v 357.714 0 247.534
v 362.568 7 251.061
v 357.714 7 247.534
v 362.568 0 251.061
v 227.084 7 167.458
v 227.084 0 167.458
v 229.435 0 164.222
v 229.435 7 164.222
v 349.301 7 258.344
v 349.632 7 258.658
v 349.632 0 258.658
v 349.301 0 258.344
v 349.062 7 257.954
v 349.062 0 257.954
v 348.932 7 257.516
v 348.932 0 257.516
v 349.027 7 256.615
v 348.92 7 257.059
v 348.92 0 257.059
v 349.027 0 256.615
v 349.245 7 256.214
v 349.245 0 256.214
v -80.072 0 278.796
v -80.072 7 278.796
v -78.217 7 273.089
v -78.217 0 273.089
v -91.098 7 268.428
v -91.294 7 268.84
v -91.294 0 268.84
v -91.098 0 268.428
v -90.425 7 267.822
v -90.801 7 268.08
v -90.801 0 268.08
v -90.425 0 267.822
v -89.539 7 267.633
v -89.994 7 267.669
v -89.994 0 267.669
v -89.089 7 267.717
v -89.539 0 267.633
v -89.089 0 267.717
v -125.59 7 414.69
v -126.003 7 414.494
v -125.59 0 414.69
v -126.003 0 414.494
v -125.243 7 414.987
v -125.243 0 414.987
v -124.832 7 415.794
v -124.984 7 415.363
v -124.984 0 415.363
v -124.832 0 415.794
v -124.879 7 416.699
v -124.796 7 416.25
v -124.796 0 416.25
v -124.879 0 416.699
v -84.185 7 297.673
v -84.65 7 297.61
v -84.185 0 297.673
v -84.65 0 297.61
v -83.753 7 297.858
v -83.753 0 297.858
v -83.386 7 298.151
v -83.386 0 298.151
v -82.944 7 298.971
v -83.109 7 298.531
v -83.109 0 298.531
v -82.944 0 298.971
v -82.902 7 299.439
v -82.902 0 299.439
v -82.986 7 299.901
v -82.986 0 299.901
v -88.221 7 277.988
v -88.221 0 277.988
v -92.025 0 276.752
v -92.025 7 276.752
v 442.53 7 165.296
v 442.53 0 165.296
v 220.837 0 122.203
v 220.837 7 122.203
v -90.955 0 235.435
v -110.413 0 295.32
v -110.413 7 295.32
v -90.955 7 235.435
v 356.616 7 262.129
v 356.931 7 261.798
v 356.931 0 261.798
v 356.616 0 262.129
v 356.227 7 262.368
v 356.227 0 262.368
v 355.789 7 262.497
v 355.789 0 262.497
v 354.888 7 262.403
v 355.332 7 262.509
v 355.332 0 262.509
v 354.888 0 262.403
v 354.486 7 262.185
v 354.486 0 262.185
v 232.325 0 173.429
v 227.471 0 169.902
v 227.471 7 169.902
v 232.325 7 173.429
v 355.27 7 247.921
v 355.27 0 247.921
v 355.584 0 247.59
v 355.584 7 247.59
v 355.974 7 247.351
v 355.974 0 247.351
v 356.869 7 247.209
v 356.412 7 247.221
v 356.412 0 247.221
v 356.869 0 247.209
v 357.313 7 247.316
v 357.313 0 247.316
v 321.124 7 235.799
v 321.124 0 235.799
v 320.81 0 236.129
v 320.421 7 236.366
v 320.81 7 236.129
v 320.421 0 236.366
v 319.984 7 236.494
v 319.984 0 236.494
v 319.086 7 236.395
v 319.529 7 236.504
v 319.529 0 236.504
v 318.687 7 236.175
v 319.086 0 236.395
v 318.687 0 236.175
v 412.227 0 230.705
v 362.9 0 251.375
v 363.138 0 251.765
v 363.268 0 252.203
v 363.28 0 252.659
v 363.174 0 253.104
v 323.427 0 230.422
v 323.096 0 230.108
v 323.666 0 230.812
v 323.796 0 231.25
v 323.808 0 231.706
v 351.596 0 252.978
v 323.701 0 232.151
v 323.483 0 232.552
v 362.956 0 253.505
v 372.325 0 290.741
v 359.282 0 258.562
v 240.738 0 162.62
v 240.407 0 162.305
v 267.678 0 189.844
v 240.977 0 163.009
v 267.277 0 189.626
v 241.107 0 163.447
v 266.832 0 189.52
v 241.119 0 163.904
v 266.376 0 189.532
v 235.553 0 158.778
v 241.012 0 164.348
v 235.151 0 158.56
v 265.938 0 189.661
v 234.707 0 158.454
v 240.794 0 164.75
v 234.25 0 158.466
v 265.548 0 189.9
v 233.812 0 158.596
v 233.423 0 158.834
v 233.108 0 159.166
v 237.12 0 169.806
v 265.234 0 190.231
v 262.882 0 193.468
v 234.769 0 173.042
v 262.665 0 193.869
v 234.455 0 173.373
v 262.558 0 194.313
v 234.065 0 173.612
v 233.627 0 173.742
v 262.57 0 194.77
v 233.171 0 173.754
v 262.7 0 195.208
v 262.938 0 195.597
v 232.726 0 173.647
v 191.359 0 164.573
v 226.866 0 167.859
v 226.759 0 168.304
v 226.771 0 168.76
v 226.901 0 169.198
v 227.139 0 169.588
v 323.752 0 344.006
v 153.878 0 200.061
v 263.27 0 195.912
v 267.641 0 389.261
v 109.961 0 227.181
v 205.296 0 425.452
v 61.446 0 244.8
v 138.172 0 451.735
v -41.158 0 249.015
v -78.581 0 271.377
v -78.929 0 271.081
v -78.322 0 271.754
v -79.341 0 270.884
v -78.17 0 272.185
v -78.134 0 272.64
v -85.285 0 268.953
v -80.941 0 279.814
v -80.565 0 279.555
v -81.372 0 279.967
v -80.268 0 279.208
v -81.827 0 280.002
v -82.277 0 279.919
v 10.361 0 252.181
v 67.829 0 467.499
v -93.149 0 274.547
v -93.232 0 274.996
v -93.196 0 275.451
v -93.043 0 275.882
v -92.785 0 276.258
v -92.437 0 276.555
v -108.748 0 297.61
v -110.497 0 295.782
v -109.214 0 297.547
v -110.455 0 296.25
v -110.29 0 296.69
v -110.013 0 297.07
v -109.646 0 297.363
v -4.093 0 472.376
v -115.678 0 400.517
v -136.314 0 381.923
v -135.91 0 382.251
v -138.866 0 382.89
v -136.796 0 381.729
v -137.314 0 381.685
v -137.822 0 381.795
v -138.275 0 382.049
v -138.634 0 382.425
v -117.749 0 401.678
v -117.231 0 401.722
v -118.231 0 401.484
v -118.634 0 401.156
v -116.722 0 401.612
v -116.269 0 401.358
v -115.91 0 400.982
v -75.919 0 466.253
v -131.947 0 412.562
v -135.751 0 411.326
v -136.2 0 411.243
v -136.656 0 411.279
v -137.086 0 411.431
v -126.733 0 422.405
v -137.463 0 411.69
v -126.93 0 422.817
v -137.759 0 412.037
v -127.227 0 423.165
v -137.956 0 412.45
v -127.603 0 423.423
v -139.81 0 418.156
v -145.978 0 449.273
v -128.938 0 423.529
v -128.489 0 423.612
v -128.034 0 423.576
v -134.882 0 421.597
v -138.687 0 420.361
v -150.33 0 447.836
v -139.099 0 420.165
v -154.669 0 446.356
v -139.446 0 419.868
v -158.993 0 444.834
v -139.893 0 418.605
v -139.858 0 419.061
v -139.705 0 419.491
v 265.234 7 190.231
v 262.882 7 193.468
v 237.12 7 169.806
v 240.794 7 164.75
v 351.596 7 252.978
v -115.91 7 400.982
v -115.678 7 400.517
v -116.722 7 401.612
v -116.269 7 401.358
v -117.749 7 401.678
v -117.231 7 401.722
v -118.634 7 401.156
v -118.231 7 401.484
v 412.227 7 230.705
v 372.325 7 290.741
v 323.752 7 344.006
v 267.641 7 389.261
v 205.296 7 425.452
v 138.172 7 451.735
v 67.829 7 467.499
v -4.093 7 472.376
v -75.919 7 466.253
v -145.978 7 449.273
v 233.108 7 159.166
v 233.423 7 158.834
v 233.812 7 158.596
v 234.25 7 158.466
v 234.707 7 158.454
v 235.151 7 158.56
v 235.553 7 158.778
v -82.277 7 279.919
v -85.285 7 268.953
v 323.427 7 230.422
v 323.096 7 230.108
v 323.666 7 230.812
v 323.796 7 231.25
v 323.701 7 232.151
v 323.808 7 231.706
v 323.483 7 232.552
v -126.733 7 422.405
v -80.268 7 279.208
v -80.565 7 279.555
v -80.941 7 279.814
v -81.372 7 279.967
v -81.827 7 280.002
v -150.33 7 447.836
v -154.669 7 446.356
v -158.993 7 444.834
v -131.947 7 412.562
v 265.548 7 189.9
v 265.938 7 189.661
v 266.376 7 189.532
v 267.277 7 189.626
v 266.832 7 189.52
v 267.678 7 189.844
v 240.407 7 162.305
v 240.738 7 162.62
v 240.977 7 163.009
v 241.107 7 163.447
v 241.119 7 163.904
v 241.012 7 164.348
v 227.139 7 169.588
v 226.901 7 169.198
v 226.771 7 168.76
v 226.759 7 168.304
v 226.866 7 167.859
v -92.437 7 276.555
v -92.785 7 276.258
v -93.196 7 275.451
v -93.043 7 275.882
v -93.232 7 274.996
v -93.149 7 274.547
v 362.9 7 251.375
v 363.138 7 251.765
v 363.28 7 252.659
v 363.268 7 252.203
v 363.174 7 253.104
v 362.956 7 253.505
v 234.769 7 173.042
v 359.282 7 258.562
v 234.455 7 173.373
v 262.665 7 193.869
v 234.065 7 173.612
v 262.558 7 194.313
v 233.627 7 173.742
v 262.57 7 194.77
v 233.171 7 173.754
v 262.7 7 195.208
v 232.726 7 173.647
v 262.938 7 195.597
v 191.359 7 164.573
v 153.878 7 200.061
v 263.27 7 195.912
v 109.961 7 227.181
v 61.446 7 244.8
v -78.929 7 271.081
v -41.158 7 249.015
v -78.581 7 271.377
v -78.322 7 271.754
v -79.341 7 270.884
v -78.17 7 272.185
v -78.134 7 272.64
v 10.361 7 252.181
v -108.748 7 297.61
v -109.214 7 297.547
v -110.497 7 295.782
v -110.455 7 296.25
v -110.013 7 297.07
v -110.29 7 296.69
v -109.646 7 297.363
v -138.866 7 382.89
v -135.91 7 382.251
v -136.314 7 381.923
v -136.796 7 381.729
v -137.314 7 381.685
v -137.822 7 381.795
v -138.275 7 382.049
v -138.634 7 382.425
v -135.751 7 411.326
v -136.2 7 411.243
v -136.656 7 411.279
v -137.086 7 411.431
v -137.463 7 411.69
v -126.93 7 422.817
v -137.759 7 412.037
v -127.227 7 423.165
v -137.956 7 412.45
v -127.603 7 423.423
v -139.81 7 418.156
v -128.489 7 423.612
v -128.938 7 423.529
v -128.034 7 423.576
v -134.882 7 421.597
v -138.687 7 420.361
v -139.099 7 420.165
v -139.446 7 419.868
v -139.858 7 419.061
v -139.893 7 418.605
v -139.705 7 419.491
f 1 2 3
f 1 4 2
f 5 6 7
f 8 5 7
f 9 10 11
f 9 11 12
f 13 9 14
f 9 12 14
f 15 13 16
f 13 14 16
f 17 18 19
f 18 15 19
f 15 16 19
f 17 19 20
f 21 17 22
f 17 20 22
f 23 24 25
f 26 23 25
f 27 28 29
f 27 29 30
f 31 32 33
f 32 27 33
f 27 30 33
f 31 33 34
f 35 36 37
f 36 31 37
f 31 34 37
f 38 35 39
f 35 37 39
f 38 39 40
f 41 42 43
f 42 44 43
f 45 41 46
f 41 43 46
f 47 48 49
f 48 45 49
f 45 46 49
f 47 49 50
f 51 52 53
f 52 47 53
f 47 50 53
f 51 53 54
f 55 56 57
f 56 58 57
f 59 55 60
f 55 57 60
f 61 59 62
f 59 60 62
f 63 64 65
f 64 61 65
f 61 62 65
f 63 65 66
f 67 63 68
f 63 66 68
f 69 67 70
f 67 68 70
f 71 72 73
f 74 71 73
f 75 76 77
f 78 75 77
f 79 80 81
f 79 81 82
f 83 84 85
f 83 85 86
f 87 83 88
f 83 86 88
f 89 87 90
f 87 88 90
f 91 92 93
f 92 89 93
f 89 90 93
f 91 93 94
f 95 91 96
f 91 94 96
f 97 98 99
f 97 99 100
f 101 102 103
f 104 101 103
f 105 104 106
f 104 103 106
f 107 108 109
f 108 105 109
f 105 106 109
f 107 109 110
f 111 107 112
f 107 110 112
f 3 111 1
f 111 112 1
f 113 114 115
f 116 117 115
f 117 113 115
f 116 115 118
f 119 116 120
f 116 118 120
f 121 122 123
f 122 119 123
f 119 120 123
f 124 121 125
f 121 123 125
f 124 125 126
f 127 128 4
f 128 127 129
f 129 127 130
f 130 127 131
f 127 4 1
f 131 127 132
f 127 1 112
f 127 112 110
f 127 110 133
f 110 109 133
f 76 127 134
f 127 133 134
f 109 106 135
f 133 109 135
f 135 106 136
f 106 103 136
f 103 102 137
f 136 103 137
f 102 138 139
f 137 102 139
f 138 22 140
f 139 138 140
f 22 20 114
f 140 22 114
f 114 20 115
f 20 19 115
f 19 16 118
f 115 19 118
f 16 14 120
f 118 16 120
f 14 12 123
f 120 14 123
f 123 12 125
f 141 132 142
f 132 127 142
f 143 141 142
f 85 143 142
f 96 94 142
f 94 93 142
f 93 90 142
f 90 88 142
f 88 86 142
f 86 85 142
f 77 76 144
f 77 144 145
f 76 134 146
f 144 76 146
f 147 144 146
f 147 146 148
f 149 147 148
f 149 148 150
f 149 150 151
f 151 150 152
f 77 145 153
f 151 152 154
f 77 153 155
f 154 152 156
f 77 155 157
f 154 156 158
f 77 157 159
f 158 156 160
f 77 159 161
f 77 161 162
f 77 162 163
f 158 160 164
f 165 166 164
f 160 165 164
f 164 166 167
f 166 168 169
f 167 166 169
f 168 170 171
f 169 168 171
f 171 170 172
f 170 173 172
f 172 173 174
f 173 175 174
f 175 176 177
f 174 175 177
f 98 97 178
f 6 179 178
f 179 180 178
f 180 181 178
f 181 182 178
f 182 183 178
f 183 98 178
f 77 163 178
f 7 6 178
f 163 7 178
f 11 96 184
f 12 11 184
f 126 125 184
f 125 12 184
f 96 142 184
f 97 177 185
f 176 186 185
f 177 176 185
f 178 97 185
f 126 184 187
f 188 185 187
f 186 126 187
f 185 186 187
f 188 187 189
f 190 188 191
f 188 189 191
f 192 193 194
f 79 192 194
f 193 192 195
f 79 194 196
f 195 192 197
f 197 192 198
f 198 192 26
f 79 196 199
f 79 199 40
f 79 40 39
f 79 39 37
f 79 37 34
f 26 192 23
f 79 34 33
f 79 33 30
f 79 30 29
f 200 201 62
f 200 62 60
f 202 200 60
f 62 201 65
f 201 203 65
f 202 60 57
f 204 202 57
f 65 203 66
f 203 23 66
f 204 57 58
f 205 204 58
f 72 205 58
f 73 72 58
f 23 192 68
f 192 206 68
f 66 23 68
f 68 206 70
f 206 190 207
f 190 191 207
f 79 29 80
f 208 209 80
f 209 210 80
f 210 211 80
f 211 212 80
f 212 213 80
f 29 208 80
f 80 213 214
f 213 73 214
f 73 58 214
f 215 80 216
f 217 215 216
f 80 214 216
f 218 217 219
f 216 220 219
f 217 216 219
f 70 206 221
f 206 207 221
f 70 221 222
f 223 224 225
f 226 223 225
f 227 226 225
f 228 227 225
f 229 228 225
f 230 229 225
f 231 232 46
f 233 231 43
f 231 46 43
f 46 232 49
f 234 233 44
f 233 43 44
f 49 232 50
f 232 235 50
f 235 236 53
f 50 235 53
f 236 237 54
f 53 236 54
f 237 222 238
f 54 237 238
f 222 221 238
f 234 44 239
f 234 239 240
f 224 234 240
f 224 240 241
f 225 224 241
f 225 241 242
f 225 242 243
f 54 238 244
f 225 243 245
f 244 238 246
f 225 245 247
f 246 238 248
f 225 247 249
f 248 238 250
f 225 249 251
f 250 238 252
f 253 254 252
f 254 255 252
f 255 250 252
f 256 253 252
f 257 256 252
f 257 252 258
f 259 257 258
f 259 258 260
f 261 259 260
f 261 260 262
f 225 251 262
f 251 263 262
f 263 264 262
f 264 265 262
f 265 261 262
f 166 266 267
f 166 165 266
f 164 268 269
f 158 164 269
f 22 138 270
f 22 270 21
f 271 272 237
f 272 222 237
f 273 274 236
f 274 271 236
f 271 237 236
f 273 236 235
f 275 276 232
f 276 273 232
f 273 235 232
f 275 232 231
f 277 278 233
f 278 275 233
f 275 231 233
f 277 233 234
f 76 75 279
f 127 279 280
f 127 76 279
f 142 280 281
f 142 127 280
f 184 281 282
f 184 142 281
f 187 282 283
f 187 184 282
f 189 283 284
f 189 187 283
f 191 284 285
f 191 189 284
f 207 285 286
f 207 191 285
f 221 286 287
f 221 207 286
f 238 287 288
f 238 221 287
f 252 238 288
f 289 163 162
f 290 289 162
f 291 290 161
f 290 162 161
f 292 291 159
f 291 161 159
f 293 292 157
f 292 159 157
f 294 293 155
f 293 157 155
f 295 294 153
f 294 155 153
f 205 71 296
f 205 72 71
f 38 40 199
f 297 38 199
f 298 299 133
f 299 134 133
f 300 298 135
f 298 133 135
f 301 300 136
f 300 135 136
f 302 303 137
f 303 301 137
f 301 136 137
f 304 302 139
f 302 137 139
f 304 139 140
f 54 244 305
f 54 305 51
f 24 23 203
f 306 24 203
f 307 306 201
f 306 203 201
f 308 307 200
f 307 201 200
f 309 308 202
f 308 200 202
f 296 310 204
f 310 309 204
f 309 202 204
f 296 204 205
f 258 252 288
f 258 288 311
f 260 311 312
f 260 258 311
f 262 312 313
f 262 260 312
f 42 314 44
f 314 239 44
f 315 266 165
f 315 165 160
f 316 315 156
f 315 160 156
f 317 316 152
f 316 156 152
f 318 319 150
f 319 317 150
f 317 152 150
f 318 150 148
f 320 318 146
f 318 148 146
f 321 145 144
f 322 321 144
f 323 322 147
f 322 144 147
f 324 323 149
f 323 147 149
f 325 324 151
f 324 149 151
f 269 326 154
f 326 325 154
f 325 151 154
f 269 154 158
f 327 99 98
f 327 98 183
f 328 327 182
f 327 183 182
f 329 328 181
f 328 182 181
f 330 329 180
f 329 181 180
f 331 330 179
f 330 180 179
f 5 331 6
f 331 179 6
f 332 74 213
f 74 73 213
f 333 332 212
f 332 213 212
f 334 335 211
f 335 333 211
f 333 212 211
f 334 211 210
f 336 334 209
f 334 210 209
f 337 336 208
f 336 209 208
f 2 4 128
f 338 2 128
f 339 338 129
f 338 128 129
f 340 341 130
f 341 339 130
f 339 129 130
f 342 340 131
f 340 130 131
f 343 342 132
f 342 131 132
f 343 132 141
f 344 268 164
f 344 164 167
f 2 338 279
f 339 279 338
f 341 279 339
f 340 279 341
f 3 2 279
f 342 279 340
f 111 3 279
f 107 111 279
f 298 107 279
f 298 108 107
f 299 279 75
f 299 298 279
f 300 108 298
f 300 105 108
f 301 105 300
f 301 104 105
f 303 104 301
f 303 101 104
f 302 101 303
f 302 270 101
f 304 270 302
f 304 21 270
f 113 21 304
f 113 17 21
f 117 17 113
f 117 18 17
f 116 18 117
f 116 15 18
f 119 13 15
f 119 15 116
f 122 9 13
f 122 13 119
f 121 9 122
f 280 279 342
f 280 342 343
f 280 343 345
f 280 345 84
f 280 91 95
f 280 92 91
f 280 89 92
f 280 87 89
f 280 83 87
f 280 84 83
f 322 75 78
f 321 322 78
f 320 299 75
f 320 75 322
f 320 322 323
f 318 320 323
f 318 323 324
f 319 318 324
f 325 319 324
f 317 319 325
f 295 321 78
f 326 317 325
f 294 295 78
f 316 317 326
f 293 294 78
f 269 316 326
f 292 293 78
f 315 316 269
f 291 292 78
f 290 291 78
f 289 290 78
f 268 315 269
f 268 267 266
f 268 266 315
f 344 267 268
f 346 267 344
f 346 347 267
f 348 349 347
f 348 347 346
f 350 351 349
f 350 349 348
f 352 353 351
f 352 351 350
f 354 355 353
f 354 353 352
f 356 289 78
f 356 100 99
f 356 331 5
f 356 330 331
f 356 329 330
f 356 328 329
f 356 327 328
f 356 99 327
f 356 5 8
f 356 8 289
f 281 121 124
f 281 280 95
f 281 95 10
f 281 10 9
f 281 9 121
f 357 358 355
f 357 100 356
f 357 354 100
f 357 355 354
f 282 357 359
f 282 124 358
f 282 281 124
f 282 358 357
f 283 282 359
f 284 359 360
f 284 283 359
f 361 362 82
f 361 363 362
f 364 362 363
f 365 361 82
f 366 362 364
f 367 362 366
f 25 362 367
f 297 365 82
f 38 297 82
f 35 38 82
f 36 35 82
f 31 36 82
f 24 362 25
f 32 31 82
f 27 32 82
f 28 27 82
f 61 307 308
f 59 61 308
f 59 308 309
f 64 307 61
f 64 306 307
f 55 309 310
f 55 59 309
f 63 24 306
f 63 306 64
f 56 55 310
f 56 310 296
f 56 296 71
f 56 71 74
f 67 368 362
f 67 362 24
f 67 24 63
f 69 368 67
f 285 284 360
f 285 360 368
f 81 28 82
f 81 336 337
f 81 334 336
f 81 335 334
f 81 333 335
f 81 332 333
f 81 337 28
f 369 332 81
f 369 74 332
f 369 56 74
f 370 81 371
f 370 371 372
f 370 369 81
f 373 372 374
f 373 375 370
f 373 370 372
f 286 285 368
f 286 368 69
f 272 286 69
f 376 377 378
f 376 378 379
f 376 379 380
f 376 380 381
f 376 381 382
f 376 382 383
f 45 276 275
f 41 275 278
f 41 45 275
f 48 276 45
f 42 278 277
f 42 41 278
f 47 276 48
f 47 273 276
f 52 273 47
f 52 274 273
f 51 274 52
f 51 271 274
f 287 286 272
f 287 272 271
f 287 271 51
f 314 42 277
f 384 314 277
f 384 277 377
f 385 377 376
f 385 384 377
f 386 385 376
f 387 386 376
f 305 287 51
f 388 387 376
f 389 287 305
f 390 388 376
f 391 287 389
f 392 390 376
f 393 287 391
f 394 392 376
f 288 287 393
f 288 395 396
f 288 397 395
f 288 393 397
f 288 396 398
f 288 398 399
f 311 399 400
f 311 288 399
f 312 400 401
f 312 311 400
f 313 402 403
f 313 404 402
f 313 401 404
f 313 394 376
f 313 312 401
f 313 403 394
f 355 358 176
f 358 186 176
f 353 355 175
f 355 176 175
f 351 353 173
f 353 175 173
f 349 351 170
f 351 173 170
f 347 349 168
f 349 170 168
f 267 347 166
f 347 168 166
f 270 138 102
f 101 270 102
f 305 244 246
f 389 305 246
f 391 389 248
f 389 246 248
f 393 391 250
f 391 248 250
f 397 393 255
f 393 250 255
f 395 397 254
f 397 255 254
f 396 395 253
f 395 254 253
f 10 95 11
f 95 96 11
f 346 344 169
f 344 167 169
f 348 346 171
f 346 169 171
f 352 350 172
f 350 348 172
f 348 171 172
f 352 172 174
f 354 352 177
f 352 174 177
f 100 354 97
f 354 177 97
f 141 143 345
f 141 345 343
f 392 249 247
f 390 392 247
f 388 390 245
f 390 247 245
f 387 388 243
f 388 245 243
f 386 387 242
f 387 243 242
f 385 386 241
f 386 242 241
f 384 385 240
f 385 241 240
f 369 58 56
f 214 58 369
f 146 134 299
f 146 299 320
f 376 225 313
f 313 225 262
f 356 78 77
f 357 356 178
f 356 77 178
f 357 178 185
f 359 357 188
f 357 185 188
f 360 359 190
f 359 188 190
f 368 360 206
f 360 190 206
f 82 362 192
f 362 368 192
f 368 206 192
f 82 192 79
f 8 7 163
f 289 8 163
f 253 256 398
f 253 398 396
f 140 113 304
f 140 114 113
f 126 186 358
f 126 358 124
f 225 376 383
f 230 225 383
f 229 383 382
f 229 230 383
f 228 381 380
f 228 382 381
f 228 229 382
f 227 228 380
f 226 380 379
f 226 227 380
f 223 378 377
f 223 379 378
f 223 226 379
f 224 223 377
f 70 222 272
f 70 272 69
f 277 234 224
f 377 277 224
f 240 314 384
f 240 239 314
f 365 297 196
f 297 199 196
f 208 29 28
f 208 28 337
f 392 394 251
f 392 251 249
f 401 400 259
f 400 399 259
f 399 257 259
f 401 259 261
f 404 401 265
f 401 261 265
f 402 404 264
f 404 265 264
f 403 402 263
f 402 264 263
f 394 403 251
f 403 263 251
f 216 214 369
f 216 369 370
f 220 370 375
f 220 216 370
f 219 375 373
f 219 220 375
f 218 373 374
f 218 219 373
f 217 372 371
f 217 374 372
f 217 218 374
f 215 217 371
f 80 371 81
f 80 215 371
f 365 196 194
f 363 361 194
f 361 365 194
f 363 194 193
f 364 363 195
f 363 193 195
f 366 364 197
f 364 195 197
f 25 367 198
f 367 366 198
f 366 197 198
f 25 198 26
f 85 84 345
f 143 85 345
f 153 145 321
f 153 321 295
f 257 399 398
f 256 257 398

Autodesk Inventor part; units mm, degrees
ref_plane "YZ Plane" through (0, 0, 0) normal (1, 0, 0) x (0, 1, 0)
ref_plane "XZ Plane" through (0, 0, 0) normal (0, 1, 0) x (-1, 0, 0)
ref_plane "XY Plane" through (0, 0, 0) normal (0, 0, 1) x (1, 0, 0)
sketch "Sketch1" plane through (0, 0, 0) normal (0, 1, 0) x (-1, 0, 0)
  line L0 (0, 0) -> (618.9442, 0)
  line L1 (0, 0) -> (191.2643, 588.6509)
  line L2 (0, 0) -> (-500.7364, 363.8063)
  line L3 (0, 0) -> (-500.7364, -363.8063)
  line L4 (0, 0) -> (191.2643, -588.6509)
  line L5 (396.6438, 3.75) -> (328.1438, 3.75)
  line L6 (328.1438, -3.75) -> (396.6438, -3.75)
  arc A0 (472.3938, 0) -> (145.9777, 449.2732) centre (0, 0) ccw
  arc A1 (77.994, -240.0408) -> (252.3938, 0) centre (0, 0) ccw
  line L7 (289.8938, 3.75) -> (283.8938, 3.75)
  line L8 (283.8938, -3.75) -> (289.8938, -3.75)
  arc A2 (328.1438, 3.75) -> (326.3938, 2) centre (328.1438, 2) ccw
  arc A3 (326.3938, -2) -> (328.1438, -3.75) centre (328.1438, -2) ccw
  line L9 (326.3938, 2) -> (326.3938, -2)
  arc A4 (398.3938, 2) -> (396.6438, 3.75) centre (396.6438, 2) ccw
  arc A5 (396.6438, -3.75) -> (398.3938, -2.0136) centre (396.6573, -2.0136) ccw
  line L10 (398.3938, -2.0136) -> (398.3938, 2)
  line L11 (362.3938, -3.75) -> (362.3938, 32.9806)
  arc A6 (283.8938, 3.75) -> (282.1438, 2) centre (283.8938, 2) ccw
  arc A7 (282.1438, -2) -> (283.8938, -3.75) centre (283.8938, -2) ccw
  arc A8 (289.8938, -3.75) -> (291.6438, -2) centre (289.8938, -2) ccw
  arc A9 (291.6438, 2) -> (289.8938, 3.75) centre (289.8938, 2) ccw
  line L12 (291.6438, 2) -> (291.6438, -2)
  line L13 (282.1438, -2) -> (282.1438, 2)
  line L14 (434.8938, 3.75) -> (440.8938, 3.75)
  line L15 (440.8938, -3.75) -> (434.8938, -3.75)
  arc A10 (442.6438, 2) -> (440.8938, 3.75) centre (440.8938, 2) ccw
  arc A11 (440.8938, -3.75) -> (442.6438, -2) centre (440.8938, -2) ccw
  arc A12 (433.1438, -2) -> (434.8938, -3.75) centre (434.8938, -2) ccw
  arc A13 (434.8938, 3.75) -> (433.1438, 2) centre (434.8938, 2) ccw
  line L16 (433.1438, 2) -> (433.1438, -2)
  line L17 (442.6438, -2) -> (442.6438, 2)
  line L18 (131.9467, 412.5623) -> (135.7509, 411.3262)
  arc A14 (130.8231, 414.7674) -> (131.9467, 412.5623) centre (132.4875, 414.2266) ccw
  arc A15 (135.7509, 411.3262) -> (137.956, 412.4498) centre (136.2917, 412.9905) ccw
  line L19 (139.8101, 418.1561) -> (137.956, 412.4498)
  line L20 (130.8231, 414.7674) -> (132.6772, 420.4737)
  arc A16 (134.8823, 421.5973) -> (132.6772, 420.4737) centre (134.3416, 419.9329) ccw
  line L21 (138.6866, 420.3612) -> (134.8823, 421.5973)
  arc A17 (139.8101, 418.1561) -> (138.6866, 420.3612) centre (138.1458, 418.6969) ccw
  line L22 (125.0255, 378.2728) -> (121.2083, 379.513)
  arc A18 (121.2083, 379.513) -> (119.0032, 378.3895) centre (120.6676, 377.8487) ccw
  arc A19 (126.1361, 376.0718) -> (125.0255, 378.2728) centre (124.4888, 376.6213) ccw
  line L23 (119.0032, 378.3895) -> (97.8355, 313.2421)
  line L24 (98.9591, 311.037) -> (102.7633, 309.8009)
  arc A20 (97.8355, 313.2421) -> (98.9591, 311.037) centre (99.4999, 312.7013) ccw
  arc A21 (102.7633, 309.8009) -> (104.9685, 310.9245) centre (103.3041, 311.4652) ccw
  line L25 (104.9685, 310.9245) -> (126.1361, 376.0718)
  line L26 (88.2208, 277.9878) -> (92.025, 276.7517)
  arc A22 (93.1486, 274.5466) -> (92.025, 276.7517) centre (91.4842, 275.0873) ccw
  line L27 (91.2945, 268.8402) -> (93.1486, 274.5466)
  arc A23 (88.2208, 277.9878) -> (86.0156, 276.8642) centre (87.68, 276.3234) ccw
  line L28 (86.0156, 276.8642) -> (84.1615, 271.1578)
  arc A24 (84.1615, 271.1578) -> (85.2851, 268.9527) centre (85.8259, 270.6171) ccw
  arc A25 (89.0893, 267.7166) -> (91.2945, 268.8402) centre (89.6301, 269.381) ccw
  line L29 (89.0893, 267.7166) -> (85.2851, 268.9527)
  line L30 (-351.5963, 252.9775) -> (-349.2451, 256.2136)
  arc A26 (-354.0407, 252.5903) -> (-351.5963, 252.9775) centre (-353.012, 254.0061) ccw
  arc A27 (-349.2451, 256.2136) -> (-349.6323, 258.658) centre (-350.6609, 257.2422) ccw
  line L31 (-354.4864, 262.1847) -> (-349.6323, 258.658)
  line L32 (-354.0407, 252.5903) -> (-358.8948, 256.1171)
  arc A28 (-359.2819, 258.5615) -> (-358.8948, 256.1171) centre (-357.8661, 257.5328) ccw
  line L33 (-356.9308, 261.7975) -> (-359.2819, 258.5615)
  arc A29 (-354.4864, 262.1847) -> (-356.9308, 261.7975) centre (-355.515, 260.7689) ccw
  line L34 (-321.1238, 235.799) -> (-323.4829, 232.552)
  arc A30 (-323.4829, 232.552) -> (-323.0958, 230.1076) centre (-322.0671, 231.5233) ccw
  arc A31 (-318.6874, 236.1752) -> (-321.1238, 235.799) centre (-319.7189, 234.7783) ccw
  line L35 (-323.0958, 230.1076) -> (-267.6781, 189.8443)
  line L36 (-265.2337, 190.2314) -> (-262.8825, 193.4675)
  arc A32 (-267.6781, 189.8443) -> (-265.2337, 190.2314) centre (-266.6495, 191.26) ccw
  arc A33 (-262.8825, 193.4675) -> (-263.2697, 195.9119) centre (-264.2983, 194.4961) ccw
  line L37 (-263.2697, 195.9119) -> (-318.6874, 236.1752)
  line L38 (-237.1203, 169.8059) -> (-234.7692, 173.0419)
  arc A34 (-232.3248, 173.4291) -> (-234.7692, 173.0419) centre (-233.3534, 172.0133) ccw
  line L39 (-227.4707, 169.9024) -> (-232.3248, 173.4291)
  arc A35 (-237.1203, 169.8059) -> (-236.7332, 167.3615) centre (-235.7046, 168.7773) ccw
  line L40 (-236.7332, 167.3615) -> (-231.8791, 163.8348)
  arc A36 (-231.8791, 163.8348) -> (-229.4347, 164.2219) centre (-230.8505, 165.2505) ccw
  arc A37 (-227.0835, 167.458) -> (-227.4707, 169.9024) centre (-228.4993, 168.4866) ccw
  line L41 (-227.0835, 167.458) -> (-229.4347, 164.2219)
  line L42 (-349.2451, -256.2136) -> (-351.5963, -252.9775)
  arc A38 (-349.6323, -258.658) -> (-349.2451, -256.2136) centre (-350.6609, -257.2422) ccw
  arc A39 (-351.5963, -252.9775) -> (-354.0407, -252.5903) centre (-353.012, -254.0061) ccw
  line L43 (-358.8948, -256.117) -> (-354.0407, -252.5903)
  line L44 (-349.6323, -258.658) -> (-354.4864, -262.1847)
  arc A40 (-356.9308, -261.7975) -> (-354.4864, -262.1847) centre (-355.515, -260.7689) ccw
  line L45 (-359.2819, -258.5615) -> (-356.9308, -261.7975)
  arc A41 (-358.8948, -256.117) -> (-359.2819, -258.5615) centre (-357.8661, -257.5328) ccw
  line L46 (-323.4909, -232.541) -> (-321.1318, -235.788)
  arc A42 (-321.1318, -235.788) -> (-318.6874, -236.1752) centre (-319.716, -234.7594) ccw
  arc A43 (-323.0958, -230.1076) -> (-323.4909, -232.541) centre (-322.086, -231.5203) ccw
  line L47 (-318.6874, -236.1752) -> (-263.2697, -195.9119)
  line L48 (-262.8825, -193.4675) -> (-265.2337, -190.2314)
  arc A44 (-263.2697, -195.9119) -> (-262.8825, -193.4675) centre (-264.2983, -194.4961) ccw
  arc A45 (-265.2337, -190.2314) -> (-267.6781, -189.8443) centre (-266.6495, -191.26) ccw
  line L49 (-267.6781, -189.8443) -> (-323.0958, -230.1076)
  line L50 (-234.7692, -173.0419) -> (-237.1203, -169.8059)
  arc A46 (-236.7332, -167.3615) -> (-237.1203, -169.8059) centre (-235.7046, -168.7773) ccw
  line L51 (-231.8791, -163.8348) -> (-236.7332, -167.3615)
  arc A47 (-234.7692, -173.0419) -> (-232.3248, -173.4291) centre (-233.3534, -172.0133) ccw
  line L52 (-232.3248, -173.4291) -> (-227.4707, -169.9024)
  arc A48 (-227.4707, -169.9024) -> (-227.0835, -167.458) centre (-228.4993, -168.4866) ccw
  arc A49 (-229.4347, -164.2219) -> (-231.8791, -163.8348) centre (-230.8505, -165.2505) ccw
  line L53 (-229.4347, -164.2219) -> (-227.0835, -167.458)
  line L54 (135.7509, -411.3262) -> (131.9467, -412.5623)
  arc A50 (137.956, -412.4498) -> (135.7509, -411.3262) centre (136.2917, -412.9905) ccw
  arc A51 (131.9467, -412.5623) -> (130.8231, -414.7674) centre (132.4875, -414.2266) ccw
  line L55 (132.6772, -420.4737) -> (130.8231, -414.7674)
  line L56 (137.956, -412.4498) -> (139.8101, -418.1561)
  arc A52 (138.6866, -420.3612) -> (139.8101, -418.1561) centre (138.1458, -418.6969) ccw
  line L57 (134.8823, -421.5973) -> (138.6866, -420.3612)
  arc A53 (132.6772, -420.4737) -> (134.8823, -421.5973) centre (134.3416, -419.9329) ccw
  line L58 (121.1954, -379.5172) -> (125.0126, -378.277)
  arc A54 (125.0126, -378.277) -> (126.1361, -376.0718) centre (124.4718, -376.6126) ccw
  arc A55 (119.0032, -378.3895) -> (121.1954, -379.5172) centre (120.6588, -377.8657) ccw
  line L59 (126.1361, -376.0718) -> (104.9685, -310.9245)
  line L60 (102.7633, -309.8009) -> (98.9591, -311.037)
  arc A56 (104.9685, -310.9245) -> (102.7633, -309.8009) centre (103.3041, -311.4652) ccw
  arc A57 (98.9591, -311.037) -> (97.8355, -313.2421) centre (99.4999, -312.7013) ccw
  line L61 (97.8355, -313.2421) -> (119.0032, -378.3895)
  line L62 (92.025, -276.7517) -> (88.2208, -277.9878)
  arc A58 (86.0156, -276.8642) -> (88.2208, -277.9878) centre (87.68, -276.3234) ccw
  line L63 (84.1615, -271.1578) -> (86.0156, -276.8642)
  arc A59 (92.025, -276.7517) -> (93.1486, -274.5466) centre (91.4842, -275.0873) ccw
  line L64 (93.1486, -274.5466) -> (91.2945, -268.8402)
  arc A60 (91.2945, -268.8402) -> (89.0893, -267.7166) centre (89.6301, -269.381) ccw
  arc A61 (85.2851, -268.9527) -> (84.1615, -271.1578) centre (85.8259, -270.6171) ccw
  line L65 (85.2851, -268.9527) -> (89.0893, -267.7166)
  line L66 (-442.5303, 165.2961) -> (-220.837, 122.2033)
  line L67 (-442.5303, -165.2961) -> (-220.837, -122.2033)
  arc A62 (252.3938, 0) -> (-220.837, 122.2033) centre (0, 0) ccw
  arc A63 (-220.837, -122.2033) -> (77.994, -240.0408) centre (0, 0) ccw
  arc A64 (145.9777, 449.2732) -> (-442.5303, 165.2961) centre (0, 0) ccw
  arc A65 (-442.5303, -165.2961) -> (472.3938, 0) centre (0, 0) ccw
  line L68 (115.6782, 400.5167) -> (82.9862, 299.9012)
  line L69 (84.6505, 297.6104) -> (108.7484, 297.6104)
  line L70 (110.4128, 295.3196) -> (90.9552, 235.4353)
  line L71 (138.8662, 382.8904) -> (158.9929, 444.8338)
  line L72 (118.6344, 401.1564) -> (135.91, 382.2507)
  line L73 (123.1169, 378.8929) -> (127.2722, 391.7035) construction
  line L74 (100.8612, 310.4189) -> (96.6995, 297.6104) construction
  arc A66 (135.91, 382.2507) -> (138.8662, 382.8904) centre (137.2019, 383.4311) ccw
  arc A67 (118.6344, 401.1564) -> (115.6782, 400.5167) centre (117.3425, 399.9759) ccw
  arc A68 (82.9862, 299.9012) -> (84.6505, 297.6104) centre (84.6505, 299.3604) ccw
  arc A69 (110.4128, 295.3196) -> (108.7484, 297.6104) centre (108.7484, 295.8604) ccw
  line L75 (407.0624, -13.75) -> (472.1936, -13.75)
  arc A70 (405.5405, -11.1361) -> (407.0624, -13.75) centre (407.0624, -12) ccw
  line L76 (418.1824, 11.1361) -> (405.5405, -11.1361)
  arc A71 (418.1824, 11.1361) -> (416.6605, 13.75) centre (416.6605, 12) ccw
  line L77 (416.6605, 13.75) -> (310.8671, 13.75)
  line L78 (309.2028, 11.4592) -> (316.6494, -11.4592)
  arc A72 (310.8671, 13.75) -> (309.2028, 11.4592) centre (310.8671, 12) ccw
  arc A73 (314.9851, -13.75) -> (316.6494, -11.4592) centre (314.9851, -12) ccw
  line L79 (314.9851, -13.75) -> (252.019, -13.75)
  line L80 (112.7122, -391.3883) -> (132.8388, -453.3318)
  arc A74 (114.7278, -389.1332) -> (112.7122, -391.3883) centre (114.3765, -390.8476) ccw
  line L81 (139.8166, -394.2739) -> (114.7278, -389.1332)
  arc A75 (139.8166, -394.2739) -> (141.8322, -392.0187) centre (140.1679, -392.5595) ccw
  line L82 (141.8322, -392.0187) -> (109.1403, -291.4032)
  line L83 (106.4473, -290.5282) -> (86.9517, -304.6926)
  arc A76 (109.1403, -291.4032) -> (106.4473, -290.5282) centre (107.4759, -291.944) ccw
  arc A77 (84.2587, -303.8176) -> (86.9517, -304.6926) centre (85.9231, -303.2768) ccw
  line L84 (84.2587, -303.8176) -> (64.8011, -243.9333)
  line L85 (-359.2819, 258.5615) -> (-362.9556, 253.5051)
  line L86 (-362.5684, 251.0607) -> (-357.7143, 247.534)
  line L87 (-351.5963, 252.9775) -> (-355.2699, 247.9211)
  arc A78 (-362.9556, 253.5051) -> (-362.5684, 251.0607) centre (-361.5398, 252.4765) ccw
  arc A79 (-357.7143, 247.534) -> (-355.2699, 247.9211) centre (-356.6857, 248.9498) ccw
  line L88 (-237.1203, 169.8059) -> (-240.794, 164.7495)
  line L89 (-240.4068, 162.3051) -> (-235.5527, 158.7784)
  line L90 (-229.4347, 164.2219) -> (-233.1083, 159.1656)
  arc A80 (-240.794, 164.7495) -> (-240.4068, 162.3051) centre (-239.3782, 163.7209) ccw
  arc A81 (-235.5527, 158.7784) -> (-233.1083, 159.1656) centre (-234.5241, 160.1942) ccw
  line L91 (-356.9308, -261.7975) -> (-353.2571, -266.8539)
  arc A82 (-353.2571, -266.8539) -> (-350.8127, -267.241) centre (-351.8413, -265.8253) ccw
  line L92 (-350.8127, -267.241) -> (-345.9586, -263.7143)
  arc A83 (-345.9586, -263.7143) -> (-345.5715, -261.2699) centre (-346.9872, -262.2985) ccw
  line L93 (-349.2451, -256.2136) -> (-345.5715, -261.2699)
  line L94 (-234.7692, -173.0419) -> (-231.0955, -178.0983)
  arc A84 (-231.0955, -178.0983) -> (-228.6511, -178.4855) centre (-229.6798, -177.0697) ccw
  line L95 (-228.6511, -178.4855) -> (-223.797, -174.9587)
  arc A85 (-223.797, -174.9587) -> (-223.4099, -172.5143) centre (-224.8257, -173.543) ccw
  line L96 (-227.0835, -167.458) -> (-223.4099, -172.5143)
  line L97 (138.6866, -420.3612) -> (144.6307, -418.4299)
  arc A86 (144.6307, -418.4299) -> (145.7542, -416.2247) centre (144.0899, -416.7655) ccw
  line L98 (145.7542, -416.2247) -> (143.9001, -410.5184)
  arc A87 (143.9001, -410.5184) -> (141.695, -409.3948) centre (142.2358, -411.0592) ccw
  line L99 (135.7509, -411.3262) -> (141.695, -409.3948)
  line L100 (92.025, -276.7517) -> (97.9691, -274.8203)
  arc A88 (97.9691, -274.8203) -> (99.0927, -272.6152) centre (97.4283, -273.156) ccw
  line L101 (99.0927, -272.6152) -> (97.2386, -266.9089)
  arc A89 (97.2386, -266.9089) -> (95.0334, -265.7853) centre (95.5742, -267.4496) ccw
  line L102 (89.0893, -267.7166) -> (95.0334, -265.7853)
  line L103 (442.6438, 2) -> (442.6438, 8.25)
  arc A90 (442.6438, 8.25) -> (440.8938, 10) centre (440.8938, 8.25) ccw
  line L104 (440.8938, 10) -> (434.8938, 10)
  arc A91 (434.8938, 10) -> (433.1438, 8.25) centre (434.8938, 8.25) ccw
  line L105 (433.1438, 2) -> (433.1438, 8.25)
  line L106 (291.6438, 2) -> (291.6438, 8.25)
  arc A92 (291.6438, 8.25) -> (289.8938, 10) centre (289.8938, 8.25) ccw
  line L107 (289.8938, 10) -> (283.8938, 10)
  arc A93 (283.8938, 10) -> (282.1438, 8.25) centre (283.8938, 8.25) ccw
  line L108 (282.1438, 2) -> (282.1438, 8.25)
  line L109 (134.8823, 421.5973) -> (128.9382, 423.5286)
  arc A94 (128.9382, 423.5286) -> (126.7331, 422.4051) centre (128.3975, 421.8643) ccw
  line L110 (126.7331, 422.4051) -> (124.879, 416.6987)
  arc A95 (124.879, 416.6987) -> (126.0026, 414.4936) centre (126.5434, 416.158) ccw
  line L111 (131.9467, 412.5623) -> (126.0026, 414.4936)
  line L112 (88.2208, 277.9878) -> (82.2767, 279.9191)
  arc A96 (82.2767, 279.9191) -> (80.0715, 278.7955) centre (81.7359, 278.2548) ccw
  line L113 (80.0715, 278.7955) -> (78.2174, 273.0892)
  arc A97 (78.2174, 273.0892) -> (79.341, 270.8841) centre (79.8818, 272.5484) ccw
  line L114 (85.2851, 268.9527) -> (79.341, 270.8841)
  point P0 (115.5523, 343.4982)
  point P1 (-290.9785, 216.0435)
  point P2 (-295.3869, -209.9759)
  point P3 (108.4194, -345.8158)
  point P4 (137.9375, 380.0319)
  point P5 (97.9406, 311.9068)
  point P6 (104.0986, 309.906)
  point P7 (119.8731, 379.408)
  point P8 (404.0568, -13.75)
  point P9 (411.8615, 0)
  point P10 (312.9261, 0)
  point P11 (111.7834, -388.5299)
  point P12 (127.2722, -391.7035)
  point P13 (96.6995, -297.6104)
  dimension "d4" = 360
  dimension "d6" = 7.5
  dimension "d7" = 7.5
  dimension "d9" = 68.5
  dimension "d10" = 7.5
  dimension "d11" = 7.5
  dimension "d12" = 3.5
  dimension "d13" = 3.5
  dimension "d19" = 360
  dimension "d21" = 25
  dimension "d25" = 10
  dimension "d26" = 10
  dimension "d27" = 1.75
  dimension "d30" = 144
  dimension "d34" = 0
  dimension "d35" = 8
  dimension "d36" = 1.75
  dimension "d43" = 8
  dimension "d44" = 1.75
  dimension "d47" = 360
extrude "Extrusion1" add sketch "Sketch1" along normal blind 7 contours A62 L2 L41 A37 L39 A34 L38 L36 A33 L37 A31 L34 L30 A27 L31 A29 L33 A64 L1 L21 L109 A94 L110 A95 L111 L18 L72 A67 L68 A68 L69 L26 L112 A96 L113 A97 L114 L29 | L1 L29 A25 L27 A22 L26 L69 A69 L70 A62 | A62 L66 A64 L2 L33 L85 A78 L86 A79 L87 L30 L34 A30 L35 A32 L36 L38 L88 A80 L89 A81 L90 L41 | A0 L71 A66 L72 L1 L18 A15 L19 A17 L21
properties part number "Level 1a - V2"
